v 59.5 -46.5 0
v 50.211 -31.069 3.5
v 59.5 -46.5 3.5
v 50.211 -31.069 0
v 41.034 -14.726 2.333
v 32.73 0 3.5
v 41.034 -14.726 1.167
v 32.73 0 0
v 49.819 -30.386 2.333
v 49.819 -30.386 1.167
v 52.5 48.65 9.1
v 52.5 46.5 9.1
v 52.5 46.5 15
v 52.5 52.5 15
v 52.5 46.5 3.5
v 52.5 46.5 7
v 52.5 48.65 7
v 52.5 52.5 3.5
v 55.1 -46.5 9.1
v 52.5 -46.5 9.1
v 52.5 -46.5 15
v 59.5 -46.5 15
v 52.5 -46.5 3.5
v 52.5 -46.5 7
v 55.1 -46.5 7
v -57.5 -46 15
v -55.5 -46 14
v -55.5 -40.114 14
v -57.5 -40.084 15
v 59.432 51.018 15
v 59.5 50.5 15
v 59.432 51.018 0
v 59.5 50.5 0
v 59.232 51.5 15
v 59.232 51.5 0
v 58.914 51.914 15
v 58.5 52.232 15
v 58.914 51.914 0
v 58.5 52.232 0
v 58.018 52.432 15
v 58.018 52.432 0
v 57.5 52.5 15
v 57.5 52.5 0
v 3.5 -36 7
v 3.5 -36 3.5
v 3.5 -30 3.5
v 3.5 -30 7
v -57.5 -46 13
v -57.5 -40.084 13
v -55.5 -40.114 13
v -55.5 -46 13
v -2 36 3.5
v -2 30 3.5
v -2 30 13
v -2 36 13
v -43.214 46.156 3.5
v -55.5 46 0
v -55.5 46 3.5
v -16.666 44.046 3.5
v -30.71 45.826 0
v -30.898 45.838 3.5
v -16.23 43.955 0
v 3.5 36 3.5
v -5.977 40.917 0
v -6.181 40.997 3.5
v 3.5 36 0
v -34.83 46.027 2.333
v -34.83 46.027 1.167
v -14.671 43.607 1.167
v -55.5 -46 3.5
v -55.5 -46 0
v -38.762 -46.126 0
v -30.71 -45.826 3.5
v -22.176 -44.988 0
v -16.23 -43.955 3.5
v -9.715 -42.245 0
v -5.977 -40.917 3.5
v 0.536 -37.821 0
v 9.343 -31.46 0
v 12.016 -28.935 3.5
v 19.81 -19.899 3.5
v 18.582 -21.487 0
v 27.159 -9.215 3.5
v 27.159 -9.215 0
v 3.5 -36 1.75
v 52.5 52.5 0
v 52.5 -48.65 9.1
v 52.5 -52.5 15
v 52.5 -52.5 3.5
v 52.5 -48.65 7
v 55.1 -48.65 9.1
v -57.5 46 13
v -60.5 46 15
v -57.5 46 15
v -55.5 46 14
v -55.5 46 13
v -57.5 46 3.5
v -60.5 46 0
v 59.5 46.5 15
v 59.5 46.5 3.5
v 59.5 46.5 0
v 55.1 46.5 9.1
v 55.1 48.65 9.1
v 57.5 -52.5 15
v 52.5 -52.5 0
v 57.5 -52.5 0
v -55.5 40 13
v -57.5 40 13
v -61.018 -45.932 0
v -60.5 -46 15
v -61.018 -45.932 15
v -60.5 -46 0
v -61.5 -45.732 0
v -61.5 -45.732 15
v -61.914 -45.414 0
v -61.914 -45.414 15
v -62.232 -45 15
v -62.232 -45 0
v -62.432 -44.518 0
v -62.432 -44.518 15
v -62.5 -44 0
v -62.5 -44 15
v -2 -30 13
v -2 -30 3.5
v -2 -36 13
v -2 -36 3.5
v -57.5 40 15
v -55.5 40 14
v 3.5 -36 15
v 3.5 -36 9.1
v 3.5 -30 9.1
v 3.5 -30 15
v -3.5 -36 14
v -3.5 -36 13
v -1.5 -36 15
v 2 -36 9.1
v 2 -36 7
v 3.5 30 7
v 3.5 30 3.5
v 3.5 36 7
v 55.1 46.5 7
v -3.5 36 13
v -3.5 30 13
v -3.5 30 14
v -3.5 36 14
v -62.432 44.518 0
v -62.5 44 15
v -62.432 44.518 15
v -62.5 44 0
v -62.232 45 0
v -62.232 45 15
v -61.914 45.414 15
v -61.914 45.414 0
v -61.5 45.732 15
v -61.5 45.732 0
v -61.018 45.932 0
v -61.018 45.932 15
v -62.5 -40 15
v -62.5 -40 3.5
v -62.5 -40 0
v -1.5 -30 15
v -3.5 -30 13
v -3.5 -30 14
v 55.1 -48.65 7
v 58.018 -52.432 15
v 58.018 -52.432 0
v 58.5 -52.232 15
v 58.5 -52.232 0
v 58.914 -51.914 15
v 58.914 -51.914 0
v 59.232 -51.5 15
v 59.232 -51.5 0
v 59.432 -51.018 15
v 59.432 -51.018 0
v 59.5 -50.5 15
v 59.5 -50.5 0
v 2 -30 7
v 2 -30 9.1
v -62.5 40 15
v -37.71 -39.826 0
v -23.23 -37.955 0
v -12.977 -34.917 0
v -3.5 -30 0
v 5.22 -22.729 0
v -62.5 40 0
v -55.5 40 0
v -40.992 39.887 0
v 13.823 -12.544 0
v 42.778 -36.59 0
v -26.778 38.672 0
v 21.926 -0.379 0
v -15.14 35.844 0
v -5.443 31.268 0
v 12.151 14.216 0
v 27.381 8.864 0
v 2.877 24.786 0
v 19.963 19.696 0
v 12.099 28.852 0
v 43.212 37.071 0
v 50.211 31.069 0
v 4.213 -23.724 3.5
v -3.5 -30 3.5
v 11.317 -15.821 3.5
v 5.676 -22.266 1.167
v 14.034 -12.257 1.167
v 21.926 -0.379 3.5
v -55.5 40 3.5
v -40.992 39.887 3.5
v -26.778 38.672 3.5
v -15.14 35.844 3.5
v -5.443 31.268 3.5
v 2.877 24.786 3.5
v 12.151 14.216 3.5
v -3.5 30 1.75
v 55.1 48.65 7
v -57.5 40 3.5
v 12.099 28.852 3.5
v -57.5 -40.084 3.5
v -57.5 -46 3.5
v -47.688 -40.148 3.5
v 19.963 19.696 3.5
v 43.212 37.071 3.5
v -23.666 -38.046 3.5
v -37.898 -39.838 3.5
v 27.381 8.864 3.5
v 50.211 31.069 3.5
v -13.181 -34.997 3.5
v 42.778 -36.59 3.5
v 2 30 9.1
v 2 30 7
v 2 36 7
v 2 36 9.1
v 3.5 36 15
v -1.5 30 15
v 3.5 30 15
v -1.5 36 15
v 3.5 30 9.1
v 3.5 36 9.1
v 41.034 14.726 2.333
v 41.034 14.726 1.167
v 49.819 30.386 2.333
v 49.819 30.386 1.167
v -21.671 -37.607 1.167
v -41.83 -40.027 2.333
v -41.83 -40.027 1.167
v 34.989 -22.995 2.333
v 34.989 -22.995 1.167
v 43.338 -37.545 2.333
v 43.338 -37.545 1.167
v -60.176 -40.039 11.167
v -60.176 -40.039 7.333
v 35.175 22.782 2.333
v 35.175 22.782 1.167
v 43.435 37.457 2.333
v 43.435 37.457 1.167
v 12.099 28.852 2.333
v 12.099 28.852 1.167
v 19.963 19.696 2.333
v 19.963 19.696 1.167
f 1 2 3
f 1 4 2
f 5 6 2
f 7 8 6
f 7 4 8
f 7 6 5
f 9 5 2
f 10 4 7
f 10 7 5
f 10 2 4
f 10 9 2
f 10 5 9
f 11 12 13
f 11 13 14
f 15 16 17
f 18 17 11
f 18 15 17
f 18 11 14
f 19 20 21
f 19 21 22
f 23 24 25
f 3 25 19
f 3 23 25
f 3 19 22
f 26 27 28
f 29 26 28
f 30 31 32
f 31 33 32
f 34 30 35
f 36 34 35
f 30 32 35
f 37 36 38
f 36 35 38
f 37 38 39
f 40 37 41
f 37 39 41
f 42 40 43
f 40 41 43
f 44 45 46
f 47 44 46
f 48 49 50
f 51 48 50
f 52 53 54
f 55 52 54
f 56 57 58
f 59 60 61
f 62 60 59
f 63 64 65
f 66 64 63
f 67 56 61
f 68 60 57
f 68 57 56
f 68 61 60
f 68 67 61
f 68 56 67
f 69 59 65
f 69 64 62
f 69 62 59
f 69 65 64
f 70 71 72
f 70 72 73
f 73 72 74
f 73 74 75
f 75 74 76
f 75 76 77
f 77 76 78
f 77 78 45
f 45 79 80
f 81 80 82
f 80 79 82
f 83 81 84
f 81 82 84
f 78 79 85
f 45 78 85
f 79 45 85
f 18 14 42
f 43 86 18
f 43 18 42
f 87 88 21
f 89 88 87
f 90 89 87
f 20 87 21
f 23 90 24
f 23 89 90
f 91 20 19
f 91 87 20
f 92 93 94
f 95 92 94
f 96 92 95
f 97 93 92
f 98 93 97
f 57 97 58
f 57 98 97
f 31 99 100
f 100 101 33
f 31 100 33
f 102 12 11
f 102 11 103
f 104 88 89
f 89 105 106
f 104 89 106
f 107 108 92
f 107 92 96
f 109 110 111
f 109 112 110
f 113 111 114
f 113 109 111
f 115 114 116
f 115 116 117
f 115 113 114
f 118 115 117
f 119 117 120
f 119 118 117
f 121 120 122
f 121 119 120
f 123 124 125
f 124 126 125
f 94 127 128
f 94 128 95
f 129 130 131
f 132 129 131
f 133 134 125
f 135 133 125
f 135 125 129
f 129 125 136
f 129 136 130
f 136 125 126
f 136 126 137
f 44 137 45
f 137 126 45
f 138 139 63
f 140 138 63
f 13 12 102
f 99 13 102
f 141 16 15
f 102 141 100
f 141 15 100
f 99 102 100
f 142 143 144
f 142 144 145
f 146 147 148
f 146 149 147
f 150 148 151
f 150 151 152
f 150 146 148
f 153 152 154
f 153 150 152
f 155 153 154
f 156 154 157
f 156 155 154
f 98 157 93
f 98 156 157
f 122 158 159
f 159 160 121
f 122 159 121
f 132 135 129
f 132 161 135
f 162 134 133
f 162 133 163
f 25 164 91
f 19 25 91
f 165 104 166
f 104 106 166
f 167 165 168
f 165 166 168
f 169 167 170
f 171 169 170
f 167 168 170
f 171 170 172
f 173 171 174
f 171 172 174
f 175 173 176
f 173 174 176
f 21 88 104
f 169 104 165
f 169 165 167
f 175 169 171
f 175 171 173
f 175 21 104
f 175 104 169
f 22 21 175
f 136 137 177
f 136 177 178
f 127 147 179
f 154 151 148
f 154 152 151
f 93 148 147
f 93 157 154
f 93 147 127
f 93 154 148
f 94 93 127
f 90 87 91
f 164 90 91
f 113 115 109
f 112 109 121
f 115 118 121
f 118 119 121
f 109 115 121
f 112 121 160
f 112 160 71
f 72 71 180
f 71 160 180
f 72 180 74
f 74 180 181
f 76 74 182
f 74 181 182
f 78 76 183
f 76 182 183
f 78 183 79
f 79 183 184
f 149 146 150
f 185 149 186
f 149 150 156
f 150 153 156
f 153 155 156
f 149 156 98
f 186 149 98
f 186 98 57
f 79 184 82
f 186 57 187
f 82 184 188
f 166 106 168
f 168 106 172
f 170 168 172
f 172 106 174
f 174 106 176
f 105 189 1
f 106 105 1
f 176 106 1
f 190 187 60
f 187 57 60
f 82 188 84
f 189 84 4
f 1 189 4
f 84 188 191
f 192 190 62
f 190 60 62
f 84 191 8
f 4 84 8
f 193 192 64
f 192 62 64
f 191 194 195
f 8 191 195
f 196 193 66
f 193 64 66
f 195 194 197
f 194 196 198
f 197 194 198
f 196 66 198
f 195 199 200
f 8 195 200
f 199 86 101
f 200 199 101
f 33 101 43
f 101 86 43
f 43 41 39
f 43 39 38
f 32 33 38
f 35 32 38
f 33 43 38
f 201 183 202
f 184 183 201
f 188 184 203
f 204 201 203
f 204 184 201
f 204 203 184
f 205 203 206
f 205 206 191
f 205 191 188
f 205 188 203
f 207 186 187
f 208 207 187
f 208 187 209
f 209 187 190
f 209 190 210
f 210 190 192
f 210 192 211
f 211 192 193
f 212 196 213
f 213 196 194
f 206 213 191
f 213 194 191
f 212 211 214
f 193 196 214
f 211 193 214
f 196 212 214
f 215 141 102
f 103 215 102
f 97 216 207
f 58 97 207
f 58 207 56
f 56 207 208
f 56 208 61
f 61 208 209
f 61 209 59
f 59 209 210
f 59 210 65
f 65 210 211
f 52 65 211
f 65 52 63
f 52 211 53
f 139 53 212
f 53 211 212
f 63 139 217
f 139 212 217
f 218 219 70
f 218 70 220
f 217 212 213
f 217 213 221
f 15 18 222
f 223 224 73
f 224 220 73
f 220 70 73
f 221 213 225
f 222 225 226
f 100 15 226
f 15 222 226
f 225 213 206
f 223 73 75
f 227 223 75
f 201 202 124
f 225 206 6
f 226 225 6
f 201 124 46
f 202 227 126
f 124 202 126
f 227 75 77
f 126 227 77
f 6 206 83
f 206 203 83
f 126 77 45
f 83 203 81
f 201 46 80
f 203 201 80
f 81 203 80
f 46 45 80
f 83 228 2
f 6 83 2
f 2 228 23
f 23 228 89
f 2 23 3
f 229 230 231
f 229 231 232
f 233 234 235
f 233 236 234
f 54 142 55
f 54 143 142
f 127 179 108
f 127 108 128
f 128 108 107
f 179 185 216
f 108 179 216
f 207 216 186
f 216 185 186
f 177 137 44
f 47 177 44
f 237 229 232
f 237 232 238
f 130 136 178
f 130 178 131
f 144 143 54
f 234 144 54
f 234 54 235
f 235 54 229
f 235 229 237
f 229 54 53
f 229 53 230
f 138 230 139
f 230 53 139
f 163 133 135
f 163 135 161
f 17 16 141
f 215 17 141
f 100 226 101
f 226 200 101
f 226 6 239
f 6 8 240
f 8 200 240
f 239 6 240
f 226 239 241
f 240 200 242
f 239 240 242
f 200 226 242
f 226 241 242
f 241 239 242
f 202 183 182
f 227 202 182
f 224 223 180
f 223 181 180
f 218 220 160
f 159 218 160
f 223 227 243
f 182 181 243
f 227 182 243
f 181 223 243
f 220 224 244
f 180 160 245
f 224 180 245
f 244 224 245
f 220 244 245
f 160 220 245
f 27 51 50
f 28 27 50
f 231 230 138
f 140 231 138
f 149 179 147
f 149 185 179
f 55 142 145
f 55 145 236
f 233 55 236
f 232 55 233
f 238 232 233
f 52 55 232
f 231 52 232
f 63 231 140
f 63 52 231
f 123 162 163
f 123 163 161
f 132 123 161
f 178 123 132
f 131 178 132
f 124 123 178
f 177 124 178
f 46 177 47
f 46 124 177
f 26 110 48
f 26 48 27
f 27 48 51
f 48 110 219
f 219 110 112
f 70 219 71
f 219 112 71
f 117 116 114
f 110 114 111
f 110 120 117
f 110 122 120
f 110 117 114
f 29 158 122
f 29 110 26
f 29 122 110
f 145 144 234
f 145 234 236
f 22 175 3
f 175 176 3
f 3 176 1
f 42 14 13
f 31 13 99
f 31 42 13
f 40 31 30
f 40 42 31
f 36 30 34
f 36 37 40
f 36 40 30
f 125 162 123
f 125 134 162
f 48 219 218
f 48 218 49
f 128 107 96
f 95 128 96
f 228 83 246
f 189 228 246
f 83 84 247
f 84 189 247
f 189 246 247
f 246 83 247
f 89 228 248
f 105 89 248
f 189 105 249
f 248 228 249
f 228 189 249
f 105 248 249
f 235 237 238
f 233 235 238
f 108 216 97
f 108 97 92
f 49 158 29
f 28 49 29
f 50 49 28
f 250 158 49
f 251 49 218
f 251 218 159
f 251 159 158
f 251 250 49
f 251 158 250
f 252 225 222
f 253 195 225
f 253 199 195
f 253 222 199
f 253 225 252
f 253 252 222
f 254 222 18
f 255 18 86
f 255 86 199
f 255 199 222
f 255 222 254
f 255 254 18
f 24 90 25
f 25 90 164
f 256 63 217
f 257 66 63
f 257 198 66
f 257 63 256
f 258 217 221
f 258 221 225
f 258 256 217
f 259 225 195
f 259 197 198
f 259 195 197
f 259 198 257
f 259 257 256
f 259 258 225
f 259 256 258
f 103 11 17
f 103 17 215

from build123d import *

# Parameters (mm, degrees)
F0_W       = 7
F0_H       = 6
F1_DEPTH   = 3.5
F2_DEPTH   = 15
F3_W       = 55.5
F3_H       = 9.5
F4_DEPTH   = 100
F3_W_2     = 53.1
F3_H_2     = 2.1
F5_DEPTH   = 48.65
F6_SIZE2   = 1
F6_SIZE    = 2
F6_2_SIZE2 = 1
F6_2_SIZE  = 2
F6_3_SIZE2 = 1
F6_3_SIZE  = 2
F7_SIZE2   = 2
F7_SIZE    = 1
F8_R       = 2


with BuildPart() as f1:
    # F0 (on Top) → F1 (new body)
    with BuildSketch(Plane.XY):
        with Locations((-59, 43)):
            Rectangle(F0_W, F0_H)
        with BuildLine():
            add(Edge.make_bspline(
                [(-55.5, 46), (-35.0651084215, 46.3366690111), (-13.1863134629, 47.1130676767), (3.5, 36)],
                knots=[0, 0, 0, 0, 0.4365224183, 0.4365224183, 0.4365224183, 0.4365224183], degree=3))
            Line((-55.5, 46), (-55.5, 40))
            add(Edge.make_bspline(
                [(-55.5, 40), (-37.1709838309, 40.05441996), (-18.4495575403, 40.3060604222), (-3.5, 30)],
                knots=[0, 0, 0, 0, 0.4215444213, 0.4215444213, 0.4215444213, 0.4215444213], degree=3))
            Line((-3.5, 30), (-3.5, 36))
            Line((-3.5, 36), (3.5, 36))
        make_face()
        with Locations((0, 33)):
            Rectangle(F0_W, F0_H)
        with BuildLine():
            add(Edge.make_bspline(
                [(3.5, 36), (12.561299992, 29.9651834856), (20.0913884934, 20.4242808164), (27.3811387561, 8.8639486742)],
                knots=[0.4365224183, 0.4365224183, 0.4365224183, 0.4365224183, 0.6735706191, 0.6735706191, 0.6735706191, 0.6735706191], degree=3))
            Line((3.5, 36), (3.5, 30))
            Line((3.5, 30), (-3.5, 30))
            add(Edge.make_bspline(
                [(-3.5, 30), (5.9722353572, 23.4699452033), (13.930195357, 12.7013372284), (21.9258388158, -0.3794873482)],
                knots=[0.4215444213, 0.4215444213, 0.4215444213, 0.4215444213, 0.688640485, 0.688640485, 0.688640485, 0.688640485], degree=3))
            add(Edge.make_bspline(
                [(21.9258388158, -0.3794873482), (23.7468548988, 2.5891115783), (25.5585039934, 5.6780700829), (27.3811387561, 8.8639486742)],
                knots=[0.6903483348, 0.6903483348, 0.6903483348, 0.6903483348, 0.7497888406, 0.7497888406, 0.7497888406, 0.7497888406], degree=3))
        make_face()
        with BuildLine():
            add(Edge.make_bspline(
                [(27.3811387561, 8.8639486742), (29.1720644783, 6.0238381842), (30.9484840318, 3.0618403714), (32.7295390228, 0)],
                knots=[0.6735706191, 0.6735706191, 0.6735706191, 0.6735706191, 0.7318079668, 0.7318079668, 0.7318079668, 0.7318079668], degree=3))
            add(Edge.make_bspline(
                [(21.9258388158, -0.3794873482), (23.7468548988, 2.5891115783), (25.5585039934, 5.6780700829), (27.3811387561, 8.8639486742)],
                knots=[0.6903483348, 0.6903483348, 0.6903483348, 0.6903483348, 0.7497888406, 0.7497888406, 0.7497888406, 0.7497888406], degree=3))
            add(Edge.make_bspline(
                [(21.9258388158, -0.3794873482), (23.6633015374, -3.221965904), (25.4025436645, -6.1736268671), (27.1594897195, -9.2147042555)],
                knots=[0.688640485, 0.688640485, 0.688640485, 0.688640485, 0.7466807736, 0.7466807736, 0.7466807736, 0.7466807736], degree=3))
            add(Edge.make_bspline(
                [(27.1594897195, -9.2147042555), (29.0255530458, -6.267974343), (30.875033208, -3.1881108676), (32.7295390228, 0)],
                knots=[0.6711689071, 0.6711689071, 0.6711689071, 0.6711689071, 0.7318079668, 0.7318079668, 0.7318079668, 0.7318079668], degree=3))
        make_face()
        with BuildLine():
            add(Edge.make_bspline(
                [(27.3811387561, 8.8639486742), (35.0534078745, 22.2747089818), (42.9203361457, 37.4028324845), (52.5, 52.5)],
                knots=[0.7497888406, 0.7497888406, 0.7497888406, 0.7497888406, 1, 1, 1, 1], degree=3))
            add(Edge.make_bspline(
                [(27.3811387561, 8.8639486742), (29.1720644783, 6.0238381842), (30.9484840318, 3.0618403714), (32.7295390228, 0)],
                knots=[0.6735706191, 0.6735706191, 0.6735706191, 0.6735706191, 0.7318079668, 0.7318079668, 0.7318079668, 0.7318079668], degree=3))
            add(Edge.make_bspline(
                [(32.7295390228, 0), (40.9315739468, 14.1002505736), (49.2319147047, 30.3179077966), (59.5, 46.5)],
                knots=[0.7318079668, 0.7318079668, 0.7318079668, 0.7318079668, 1, 1, 1, 1], degree=3))
            Line((59.5, 46.5), (52.5, 46.5))
            Line((52.5, 46.5), (52.5, 52.5))
        make_face()
        with BuildLine():
            add(Edge.make_bspline(
                [(32.7295390228, 0), (40.9315739468, -14.1002505736), (49.2319147047, -30.3179077966), (59.5, -46.5)],
                knots=[0.7318079668, 0.7318079668, 0.7318079668, 0.7318079668, 1, 1, 1, 1], degree=3))
            add(Edge.make_bspline(
                [(27.1594897195, -9.2147042555), (29.0255530458, -6.267974343), (30.875033208, -3.1881108676), (32.7295390228, 0)],
                knots=[0.6711689071, 0.6711689071, 0.6711689071, 0.6711689071, 0.7318079668, 0.7318079668, 0.7318079668, 0.7318079668], degree=3))
            add(Edge.make_bspline(
                [(27.1594897195, -9.2147042555), (34.8277530321, -22.4876115835), (42.833262349, -37.4638320009), (52.5, -52.5)],
                knots=[0.7466807736, 0.7466807736, 0.7466807736, 0.7466807736, 1, 1, 1, 1], degree=3))
            Line((52.5, -52.5), (52.5, -46.5))
            Line((52.5, -46.5), (59.5, -46.5))
        make_face()
        with BuildLine():
            add(Edge.make_bspline(
                [(21.9258388158, -0.3794873482), (23.6633015374, -3.221965904), (25.4025436645, -6.1736268671), (27.1594897195, -9.2147042555)],
                knots=[0.688640485, 0.688640485, 0.688640485, 0.688640485, 0.7466807736, 0.7466807736, 0.7466807736, 0.7466807736], degree=3))
            add(Edge.make_bspline(
                [(-3.5, -30), (6.2026375516, -23.5380533277), (14.1496419293, -13.0561517363), (21.9258388158, -0.3794873482)],
                knots=[0.4365224183, 0.4365224183, 0.4365224183, 0.4365224183, 0.6903483348, 0.6903483348, 0.6903483348, 0.6903483348], degree=3))
            Line((-3.5, -30), (3.5, -30))
            Line((3.5, -30), (3.5, -36))
            add(Edge.make_bspline(
                [(3.5, -36), (12.4694932079, -30.0263267098), (19.9386454326, -20.6172529014), (27.1594897195, -9.2147042555)],
                knots=[0.4365224183, 0.4365224183, 0.4365224183, 0.4365224183, 0.6711689071, 0.6711689071, 0.6711689071, 0.6711689071], degree=3))
        make_face()
        with Locations((56, 49.5)):
            Rectangle(F0_W, F0_H)
        with Locations((56, -49.5)):
            Rectangle(F0_W, F0_H)
        with Locations((0, -33)):
            Rectangle(F0_W, F0_H)
        with BuildLine():
            Line((-3.5, -36), (-3.5, -30))
            add(Edge.make_bspline(
                [(-55.5, -40.1135468303), (-37.1683816557, -40.3598255975), (-18.293541152, -39.8524832562), (-3.5, -30)],
                knots=[0.0495158831, 0.0495158831, 0.0495158831, 0.0495158831, 0.4365224183, 0.4365224183, 0.4365224183, 0.4365224183], degree=3))
            Line((-55.5, -40.1135468303), (-55.5, -46))
            add(Edge.make_bspline(
                [(-55.5, -46), (-35.0651084215, -46.3366690111), (-13.1863134629, -47.1130676767), (3.5, -36)],
                knots=[0, 0, 0, 0, 0.4365224183, 0.4365224183, 0.4365224183, 0.4365224183], degree=3))
            Line((3.5, -36), (-3.5, -36))
        make_face()
        with BuildLine():
            Line((-55.5, -46), (-55.5, -40.1135468303))
            add(Edge.make_bspline(
                [(-62.5, -40), (-60.1820166395, -40.0381892491), (-57.8454546318, -40.0820364822), (-55.5, -40.1135468303)],
                knots=[0, 0, 0, 0, 0.0495158831, 0.0495158831, 0.0495158831, 0.0495158831], degree=3))
            Line((-62.5, -40), (-62.5, -46))
            Line((-62.5, -46), (-55.5, -46))
        make_face()
    extrude(amount=F1_DEPTH)

    # F0 (on Top) → F2 (join)
    with BuildSketch(Plane.XY):
        with Locations((-59, 43)):
            Rectangle(F0_W, F0_H)
        with Locations((0, 33)):
            Rectangle(F0_W, F0_H)
        with BuildLine():
            Line((-55.5, -46), (-55.5, -40.1135468303))
            add(Edge.make_bspline(
                [(-62.5, -40), (-60.1820166395, -40.0381892491), (-57.8454546318, -40.0820364822), (-55.5, -40.1135468303)],
                knots=[0, 0, 0, 0, 0.0495158831, 0.0495158831, 0.0495158831, 0.0495158831], degree=3))
            Line((-62.5, -40), (-62.5, -46))
            Line((-62.5, -46), (-55.5, -46))
        make_face()
        with Locations((0, -33)):
            Rectangle(F0_W, F0_H)
        with Locations((56, 49.5)):
            Rectangle(F0_W, F0_H)
        with Locations((56, -49.5)):
            Rectangle(F0_W, F0_H)
    extrude(amount=F2_DEPTH)

    # F3 (on Front) → F4 (cut, symmetric)
    with BuildSketch(Plane.XZ):
        with Locations((-29.75, 8.25)):
            Rectangle(F3_W, F3_H)
    extrude(amount=F4_DEPTH, both=True, mode=Mode.SUBTRACT)

    # F3 (on Front) → F5 (cut, symmetric)
    with BuildSketch(Plane.XZ):
        with Locations((28.55, 8.05)):
            Rectangle(F3_W_2, F3_H_2)
    extrude(amount=F5_DEPTH, both=True, mode=Mode.SUBTRACT)

    # F6
    f6_edges = [f1.edges().sort_by_distance(p)[0] for p in [
        (-3.5, 33, 15),
    ]]
    f6_side = f1.faces().sort_by_distance((0, 33, 15))[0]
    chamfer(f6_edges, length=F6_SIZE, length2=F6_SIZE2, reference=f6_side)

    # F6#2
    f6_2_edges = [f1.edges().sort_by_distance(p)[0] for p in [
        (-3.5, -33, 15),
    ]]
    f6_2_side = f1.faces().sort_by_distance((0, -33, 15))[0]
    chamfer(f6_2_edges, length=F6_2_SIZE, length2=F6_2_SIZE2, reference=f6_2_side)

    # F6#3
    f6_3_edges = [f1.edges().sort_by_distance(p)[0] for p in [
        (-55.5, -43.056773, 15),
    ]]
    f6_3_side = f1.faces().sort_by_distance((-59.011322, -43.029185, 15))[0]
    chamfer(f6_3_edges, length=F6_3_SIZE, length2=F6_3_SIZE2, reference=f6_3_side)

    # F7
    f7_edges = [f1.edges().sort_by_distance(p)[0] for p in [
        (-55.5, 43, 15),
    ]]
    f7_side = f1.faces().sort_by_distance((-55.5, 43, 14))[0]
    chamfer(f7_edges, length=F7_SIZE, length2=F7_SIZE2, reference=f7_side)

    # F8
    f8_edges = [f1.edges().sort_by_distance(p)[0] for p in [
        (59.5, 52.5, 7.5),
        (59.5, -52.5, 7.5),
        (-62.5, -46, 7.5),
        (-62.5, 46, 7.5),
    ]]
    fillet(f8_edges, radius=F8_R)


solid = f1.part
